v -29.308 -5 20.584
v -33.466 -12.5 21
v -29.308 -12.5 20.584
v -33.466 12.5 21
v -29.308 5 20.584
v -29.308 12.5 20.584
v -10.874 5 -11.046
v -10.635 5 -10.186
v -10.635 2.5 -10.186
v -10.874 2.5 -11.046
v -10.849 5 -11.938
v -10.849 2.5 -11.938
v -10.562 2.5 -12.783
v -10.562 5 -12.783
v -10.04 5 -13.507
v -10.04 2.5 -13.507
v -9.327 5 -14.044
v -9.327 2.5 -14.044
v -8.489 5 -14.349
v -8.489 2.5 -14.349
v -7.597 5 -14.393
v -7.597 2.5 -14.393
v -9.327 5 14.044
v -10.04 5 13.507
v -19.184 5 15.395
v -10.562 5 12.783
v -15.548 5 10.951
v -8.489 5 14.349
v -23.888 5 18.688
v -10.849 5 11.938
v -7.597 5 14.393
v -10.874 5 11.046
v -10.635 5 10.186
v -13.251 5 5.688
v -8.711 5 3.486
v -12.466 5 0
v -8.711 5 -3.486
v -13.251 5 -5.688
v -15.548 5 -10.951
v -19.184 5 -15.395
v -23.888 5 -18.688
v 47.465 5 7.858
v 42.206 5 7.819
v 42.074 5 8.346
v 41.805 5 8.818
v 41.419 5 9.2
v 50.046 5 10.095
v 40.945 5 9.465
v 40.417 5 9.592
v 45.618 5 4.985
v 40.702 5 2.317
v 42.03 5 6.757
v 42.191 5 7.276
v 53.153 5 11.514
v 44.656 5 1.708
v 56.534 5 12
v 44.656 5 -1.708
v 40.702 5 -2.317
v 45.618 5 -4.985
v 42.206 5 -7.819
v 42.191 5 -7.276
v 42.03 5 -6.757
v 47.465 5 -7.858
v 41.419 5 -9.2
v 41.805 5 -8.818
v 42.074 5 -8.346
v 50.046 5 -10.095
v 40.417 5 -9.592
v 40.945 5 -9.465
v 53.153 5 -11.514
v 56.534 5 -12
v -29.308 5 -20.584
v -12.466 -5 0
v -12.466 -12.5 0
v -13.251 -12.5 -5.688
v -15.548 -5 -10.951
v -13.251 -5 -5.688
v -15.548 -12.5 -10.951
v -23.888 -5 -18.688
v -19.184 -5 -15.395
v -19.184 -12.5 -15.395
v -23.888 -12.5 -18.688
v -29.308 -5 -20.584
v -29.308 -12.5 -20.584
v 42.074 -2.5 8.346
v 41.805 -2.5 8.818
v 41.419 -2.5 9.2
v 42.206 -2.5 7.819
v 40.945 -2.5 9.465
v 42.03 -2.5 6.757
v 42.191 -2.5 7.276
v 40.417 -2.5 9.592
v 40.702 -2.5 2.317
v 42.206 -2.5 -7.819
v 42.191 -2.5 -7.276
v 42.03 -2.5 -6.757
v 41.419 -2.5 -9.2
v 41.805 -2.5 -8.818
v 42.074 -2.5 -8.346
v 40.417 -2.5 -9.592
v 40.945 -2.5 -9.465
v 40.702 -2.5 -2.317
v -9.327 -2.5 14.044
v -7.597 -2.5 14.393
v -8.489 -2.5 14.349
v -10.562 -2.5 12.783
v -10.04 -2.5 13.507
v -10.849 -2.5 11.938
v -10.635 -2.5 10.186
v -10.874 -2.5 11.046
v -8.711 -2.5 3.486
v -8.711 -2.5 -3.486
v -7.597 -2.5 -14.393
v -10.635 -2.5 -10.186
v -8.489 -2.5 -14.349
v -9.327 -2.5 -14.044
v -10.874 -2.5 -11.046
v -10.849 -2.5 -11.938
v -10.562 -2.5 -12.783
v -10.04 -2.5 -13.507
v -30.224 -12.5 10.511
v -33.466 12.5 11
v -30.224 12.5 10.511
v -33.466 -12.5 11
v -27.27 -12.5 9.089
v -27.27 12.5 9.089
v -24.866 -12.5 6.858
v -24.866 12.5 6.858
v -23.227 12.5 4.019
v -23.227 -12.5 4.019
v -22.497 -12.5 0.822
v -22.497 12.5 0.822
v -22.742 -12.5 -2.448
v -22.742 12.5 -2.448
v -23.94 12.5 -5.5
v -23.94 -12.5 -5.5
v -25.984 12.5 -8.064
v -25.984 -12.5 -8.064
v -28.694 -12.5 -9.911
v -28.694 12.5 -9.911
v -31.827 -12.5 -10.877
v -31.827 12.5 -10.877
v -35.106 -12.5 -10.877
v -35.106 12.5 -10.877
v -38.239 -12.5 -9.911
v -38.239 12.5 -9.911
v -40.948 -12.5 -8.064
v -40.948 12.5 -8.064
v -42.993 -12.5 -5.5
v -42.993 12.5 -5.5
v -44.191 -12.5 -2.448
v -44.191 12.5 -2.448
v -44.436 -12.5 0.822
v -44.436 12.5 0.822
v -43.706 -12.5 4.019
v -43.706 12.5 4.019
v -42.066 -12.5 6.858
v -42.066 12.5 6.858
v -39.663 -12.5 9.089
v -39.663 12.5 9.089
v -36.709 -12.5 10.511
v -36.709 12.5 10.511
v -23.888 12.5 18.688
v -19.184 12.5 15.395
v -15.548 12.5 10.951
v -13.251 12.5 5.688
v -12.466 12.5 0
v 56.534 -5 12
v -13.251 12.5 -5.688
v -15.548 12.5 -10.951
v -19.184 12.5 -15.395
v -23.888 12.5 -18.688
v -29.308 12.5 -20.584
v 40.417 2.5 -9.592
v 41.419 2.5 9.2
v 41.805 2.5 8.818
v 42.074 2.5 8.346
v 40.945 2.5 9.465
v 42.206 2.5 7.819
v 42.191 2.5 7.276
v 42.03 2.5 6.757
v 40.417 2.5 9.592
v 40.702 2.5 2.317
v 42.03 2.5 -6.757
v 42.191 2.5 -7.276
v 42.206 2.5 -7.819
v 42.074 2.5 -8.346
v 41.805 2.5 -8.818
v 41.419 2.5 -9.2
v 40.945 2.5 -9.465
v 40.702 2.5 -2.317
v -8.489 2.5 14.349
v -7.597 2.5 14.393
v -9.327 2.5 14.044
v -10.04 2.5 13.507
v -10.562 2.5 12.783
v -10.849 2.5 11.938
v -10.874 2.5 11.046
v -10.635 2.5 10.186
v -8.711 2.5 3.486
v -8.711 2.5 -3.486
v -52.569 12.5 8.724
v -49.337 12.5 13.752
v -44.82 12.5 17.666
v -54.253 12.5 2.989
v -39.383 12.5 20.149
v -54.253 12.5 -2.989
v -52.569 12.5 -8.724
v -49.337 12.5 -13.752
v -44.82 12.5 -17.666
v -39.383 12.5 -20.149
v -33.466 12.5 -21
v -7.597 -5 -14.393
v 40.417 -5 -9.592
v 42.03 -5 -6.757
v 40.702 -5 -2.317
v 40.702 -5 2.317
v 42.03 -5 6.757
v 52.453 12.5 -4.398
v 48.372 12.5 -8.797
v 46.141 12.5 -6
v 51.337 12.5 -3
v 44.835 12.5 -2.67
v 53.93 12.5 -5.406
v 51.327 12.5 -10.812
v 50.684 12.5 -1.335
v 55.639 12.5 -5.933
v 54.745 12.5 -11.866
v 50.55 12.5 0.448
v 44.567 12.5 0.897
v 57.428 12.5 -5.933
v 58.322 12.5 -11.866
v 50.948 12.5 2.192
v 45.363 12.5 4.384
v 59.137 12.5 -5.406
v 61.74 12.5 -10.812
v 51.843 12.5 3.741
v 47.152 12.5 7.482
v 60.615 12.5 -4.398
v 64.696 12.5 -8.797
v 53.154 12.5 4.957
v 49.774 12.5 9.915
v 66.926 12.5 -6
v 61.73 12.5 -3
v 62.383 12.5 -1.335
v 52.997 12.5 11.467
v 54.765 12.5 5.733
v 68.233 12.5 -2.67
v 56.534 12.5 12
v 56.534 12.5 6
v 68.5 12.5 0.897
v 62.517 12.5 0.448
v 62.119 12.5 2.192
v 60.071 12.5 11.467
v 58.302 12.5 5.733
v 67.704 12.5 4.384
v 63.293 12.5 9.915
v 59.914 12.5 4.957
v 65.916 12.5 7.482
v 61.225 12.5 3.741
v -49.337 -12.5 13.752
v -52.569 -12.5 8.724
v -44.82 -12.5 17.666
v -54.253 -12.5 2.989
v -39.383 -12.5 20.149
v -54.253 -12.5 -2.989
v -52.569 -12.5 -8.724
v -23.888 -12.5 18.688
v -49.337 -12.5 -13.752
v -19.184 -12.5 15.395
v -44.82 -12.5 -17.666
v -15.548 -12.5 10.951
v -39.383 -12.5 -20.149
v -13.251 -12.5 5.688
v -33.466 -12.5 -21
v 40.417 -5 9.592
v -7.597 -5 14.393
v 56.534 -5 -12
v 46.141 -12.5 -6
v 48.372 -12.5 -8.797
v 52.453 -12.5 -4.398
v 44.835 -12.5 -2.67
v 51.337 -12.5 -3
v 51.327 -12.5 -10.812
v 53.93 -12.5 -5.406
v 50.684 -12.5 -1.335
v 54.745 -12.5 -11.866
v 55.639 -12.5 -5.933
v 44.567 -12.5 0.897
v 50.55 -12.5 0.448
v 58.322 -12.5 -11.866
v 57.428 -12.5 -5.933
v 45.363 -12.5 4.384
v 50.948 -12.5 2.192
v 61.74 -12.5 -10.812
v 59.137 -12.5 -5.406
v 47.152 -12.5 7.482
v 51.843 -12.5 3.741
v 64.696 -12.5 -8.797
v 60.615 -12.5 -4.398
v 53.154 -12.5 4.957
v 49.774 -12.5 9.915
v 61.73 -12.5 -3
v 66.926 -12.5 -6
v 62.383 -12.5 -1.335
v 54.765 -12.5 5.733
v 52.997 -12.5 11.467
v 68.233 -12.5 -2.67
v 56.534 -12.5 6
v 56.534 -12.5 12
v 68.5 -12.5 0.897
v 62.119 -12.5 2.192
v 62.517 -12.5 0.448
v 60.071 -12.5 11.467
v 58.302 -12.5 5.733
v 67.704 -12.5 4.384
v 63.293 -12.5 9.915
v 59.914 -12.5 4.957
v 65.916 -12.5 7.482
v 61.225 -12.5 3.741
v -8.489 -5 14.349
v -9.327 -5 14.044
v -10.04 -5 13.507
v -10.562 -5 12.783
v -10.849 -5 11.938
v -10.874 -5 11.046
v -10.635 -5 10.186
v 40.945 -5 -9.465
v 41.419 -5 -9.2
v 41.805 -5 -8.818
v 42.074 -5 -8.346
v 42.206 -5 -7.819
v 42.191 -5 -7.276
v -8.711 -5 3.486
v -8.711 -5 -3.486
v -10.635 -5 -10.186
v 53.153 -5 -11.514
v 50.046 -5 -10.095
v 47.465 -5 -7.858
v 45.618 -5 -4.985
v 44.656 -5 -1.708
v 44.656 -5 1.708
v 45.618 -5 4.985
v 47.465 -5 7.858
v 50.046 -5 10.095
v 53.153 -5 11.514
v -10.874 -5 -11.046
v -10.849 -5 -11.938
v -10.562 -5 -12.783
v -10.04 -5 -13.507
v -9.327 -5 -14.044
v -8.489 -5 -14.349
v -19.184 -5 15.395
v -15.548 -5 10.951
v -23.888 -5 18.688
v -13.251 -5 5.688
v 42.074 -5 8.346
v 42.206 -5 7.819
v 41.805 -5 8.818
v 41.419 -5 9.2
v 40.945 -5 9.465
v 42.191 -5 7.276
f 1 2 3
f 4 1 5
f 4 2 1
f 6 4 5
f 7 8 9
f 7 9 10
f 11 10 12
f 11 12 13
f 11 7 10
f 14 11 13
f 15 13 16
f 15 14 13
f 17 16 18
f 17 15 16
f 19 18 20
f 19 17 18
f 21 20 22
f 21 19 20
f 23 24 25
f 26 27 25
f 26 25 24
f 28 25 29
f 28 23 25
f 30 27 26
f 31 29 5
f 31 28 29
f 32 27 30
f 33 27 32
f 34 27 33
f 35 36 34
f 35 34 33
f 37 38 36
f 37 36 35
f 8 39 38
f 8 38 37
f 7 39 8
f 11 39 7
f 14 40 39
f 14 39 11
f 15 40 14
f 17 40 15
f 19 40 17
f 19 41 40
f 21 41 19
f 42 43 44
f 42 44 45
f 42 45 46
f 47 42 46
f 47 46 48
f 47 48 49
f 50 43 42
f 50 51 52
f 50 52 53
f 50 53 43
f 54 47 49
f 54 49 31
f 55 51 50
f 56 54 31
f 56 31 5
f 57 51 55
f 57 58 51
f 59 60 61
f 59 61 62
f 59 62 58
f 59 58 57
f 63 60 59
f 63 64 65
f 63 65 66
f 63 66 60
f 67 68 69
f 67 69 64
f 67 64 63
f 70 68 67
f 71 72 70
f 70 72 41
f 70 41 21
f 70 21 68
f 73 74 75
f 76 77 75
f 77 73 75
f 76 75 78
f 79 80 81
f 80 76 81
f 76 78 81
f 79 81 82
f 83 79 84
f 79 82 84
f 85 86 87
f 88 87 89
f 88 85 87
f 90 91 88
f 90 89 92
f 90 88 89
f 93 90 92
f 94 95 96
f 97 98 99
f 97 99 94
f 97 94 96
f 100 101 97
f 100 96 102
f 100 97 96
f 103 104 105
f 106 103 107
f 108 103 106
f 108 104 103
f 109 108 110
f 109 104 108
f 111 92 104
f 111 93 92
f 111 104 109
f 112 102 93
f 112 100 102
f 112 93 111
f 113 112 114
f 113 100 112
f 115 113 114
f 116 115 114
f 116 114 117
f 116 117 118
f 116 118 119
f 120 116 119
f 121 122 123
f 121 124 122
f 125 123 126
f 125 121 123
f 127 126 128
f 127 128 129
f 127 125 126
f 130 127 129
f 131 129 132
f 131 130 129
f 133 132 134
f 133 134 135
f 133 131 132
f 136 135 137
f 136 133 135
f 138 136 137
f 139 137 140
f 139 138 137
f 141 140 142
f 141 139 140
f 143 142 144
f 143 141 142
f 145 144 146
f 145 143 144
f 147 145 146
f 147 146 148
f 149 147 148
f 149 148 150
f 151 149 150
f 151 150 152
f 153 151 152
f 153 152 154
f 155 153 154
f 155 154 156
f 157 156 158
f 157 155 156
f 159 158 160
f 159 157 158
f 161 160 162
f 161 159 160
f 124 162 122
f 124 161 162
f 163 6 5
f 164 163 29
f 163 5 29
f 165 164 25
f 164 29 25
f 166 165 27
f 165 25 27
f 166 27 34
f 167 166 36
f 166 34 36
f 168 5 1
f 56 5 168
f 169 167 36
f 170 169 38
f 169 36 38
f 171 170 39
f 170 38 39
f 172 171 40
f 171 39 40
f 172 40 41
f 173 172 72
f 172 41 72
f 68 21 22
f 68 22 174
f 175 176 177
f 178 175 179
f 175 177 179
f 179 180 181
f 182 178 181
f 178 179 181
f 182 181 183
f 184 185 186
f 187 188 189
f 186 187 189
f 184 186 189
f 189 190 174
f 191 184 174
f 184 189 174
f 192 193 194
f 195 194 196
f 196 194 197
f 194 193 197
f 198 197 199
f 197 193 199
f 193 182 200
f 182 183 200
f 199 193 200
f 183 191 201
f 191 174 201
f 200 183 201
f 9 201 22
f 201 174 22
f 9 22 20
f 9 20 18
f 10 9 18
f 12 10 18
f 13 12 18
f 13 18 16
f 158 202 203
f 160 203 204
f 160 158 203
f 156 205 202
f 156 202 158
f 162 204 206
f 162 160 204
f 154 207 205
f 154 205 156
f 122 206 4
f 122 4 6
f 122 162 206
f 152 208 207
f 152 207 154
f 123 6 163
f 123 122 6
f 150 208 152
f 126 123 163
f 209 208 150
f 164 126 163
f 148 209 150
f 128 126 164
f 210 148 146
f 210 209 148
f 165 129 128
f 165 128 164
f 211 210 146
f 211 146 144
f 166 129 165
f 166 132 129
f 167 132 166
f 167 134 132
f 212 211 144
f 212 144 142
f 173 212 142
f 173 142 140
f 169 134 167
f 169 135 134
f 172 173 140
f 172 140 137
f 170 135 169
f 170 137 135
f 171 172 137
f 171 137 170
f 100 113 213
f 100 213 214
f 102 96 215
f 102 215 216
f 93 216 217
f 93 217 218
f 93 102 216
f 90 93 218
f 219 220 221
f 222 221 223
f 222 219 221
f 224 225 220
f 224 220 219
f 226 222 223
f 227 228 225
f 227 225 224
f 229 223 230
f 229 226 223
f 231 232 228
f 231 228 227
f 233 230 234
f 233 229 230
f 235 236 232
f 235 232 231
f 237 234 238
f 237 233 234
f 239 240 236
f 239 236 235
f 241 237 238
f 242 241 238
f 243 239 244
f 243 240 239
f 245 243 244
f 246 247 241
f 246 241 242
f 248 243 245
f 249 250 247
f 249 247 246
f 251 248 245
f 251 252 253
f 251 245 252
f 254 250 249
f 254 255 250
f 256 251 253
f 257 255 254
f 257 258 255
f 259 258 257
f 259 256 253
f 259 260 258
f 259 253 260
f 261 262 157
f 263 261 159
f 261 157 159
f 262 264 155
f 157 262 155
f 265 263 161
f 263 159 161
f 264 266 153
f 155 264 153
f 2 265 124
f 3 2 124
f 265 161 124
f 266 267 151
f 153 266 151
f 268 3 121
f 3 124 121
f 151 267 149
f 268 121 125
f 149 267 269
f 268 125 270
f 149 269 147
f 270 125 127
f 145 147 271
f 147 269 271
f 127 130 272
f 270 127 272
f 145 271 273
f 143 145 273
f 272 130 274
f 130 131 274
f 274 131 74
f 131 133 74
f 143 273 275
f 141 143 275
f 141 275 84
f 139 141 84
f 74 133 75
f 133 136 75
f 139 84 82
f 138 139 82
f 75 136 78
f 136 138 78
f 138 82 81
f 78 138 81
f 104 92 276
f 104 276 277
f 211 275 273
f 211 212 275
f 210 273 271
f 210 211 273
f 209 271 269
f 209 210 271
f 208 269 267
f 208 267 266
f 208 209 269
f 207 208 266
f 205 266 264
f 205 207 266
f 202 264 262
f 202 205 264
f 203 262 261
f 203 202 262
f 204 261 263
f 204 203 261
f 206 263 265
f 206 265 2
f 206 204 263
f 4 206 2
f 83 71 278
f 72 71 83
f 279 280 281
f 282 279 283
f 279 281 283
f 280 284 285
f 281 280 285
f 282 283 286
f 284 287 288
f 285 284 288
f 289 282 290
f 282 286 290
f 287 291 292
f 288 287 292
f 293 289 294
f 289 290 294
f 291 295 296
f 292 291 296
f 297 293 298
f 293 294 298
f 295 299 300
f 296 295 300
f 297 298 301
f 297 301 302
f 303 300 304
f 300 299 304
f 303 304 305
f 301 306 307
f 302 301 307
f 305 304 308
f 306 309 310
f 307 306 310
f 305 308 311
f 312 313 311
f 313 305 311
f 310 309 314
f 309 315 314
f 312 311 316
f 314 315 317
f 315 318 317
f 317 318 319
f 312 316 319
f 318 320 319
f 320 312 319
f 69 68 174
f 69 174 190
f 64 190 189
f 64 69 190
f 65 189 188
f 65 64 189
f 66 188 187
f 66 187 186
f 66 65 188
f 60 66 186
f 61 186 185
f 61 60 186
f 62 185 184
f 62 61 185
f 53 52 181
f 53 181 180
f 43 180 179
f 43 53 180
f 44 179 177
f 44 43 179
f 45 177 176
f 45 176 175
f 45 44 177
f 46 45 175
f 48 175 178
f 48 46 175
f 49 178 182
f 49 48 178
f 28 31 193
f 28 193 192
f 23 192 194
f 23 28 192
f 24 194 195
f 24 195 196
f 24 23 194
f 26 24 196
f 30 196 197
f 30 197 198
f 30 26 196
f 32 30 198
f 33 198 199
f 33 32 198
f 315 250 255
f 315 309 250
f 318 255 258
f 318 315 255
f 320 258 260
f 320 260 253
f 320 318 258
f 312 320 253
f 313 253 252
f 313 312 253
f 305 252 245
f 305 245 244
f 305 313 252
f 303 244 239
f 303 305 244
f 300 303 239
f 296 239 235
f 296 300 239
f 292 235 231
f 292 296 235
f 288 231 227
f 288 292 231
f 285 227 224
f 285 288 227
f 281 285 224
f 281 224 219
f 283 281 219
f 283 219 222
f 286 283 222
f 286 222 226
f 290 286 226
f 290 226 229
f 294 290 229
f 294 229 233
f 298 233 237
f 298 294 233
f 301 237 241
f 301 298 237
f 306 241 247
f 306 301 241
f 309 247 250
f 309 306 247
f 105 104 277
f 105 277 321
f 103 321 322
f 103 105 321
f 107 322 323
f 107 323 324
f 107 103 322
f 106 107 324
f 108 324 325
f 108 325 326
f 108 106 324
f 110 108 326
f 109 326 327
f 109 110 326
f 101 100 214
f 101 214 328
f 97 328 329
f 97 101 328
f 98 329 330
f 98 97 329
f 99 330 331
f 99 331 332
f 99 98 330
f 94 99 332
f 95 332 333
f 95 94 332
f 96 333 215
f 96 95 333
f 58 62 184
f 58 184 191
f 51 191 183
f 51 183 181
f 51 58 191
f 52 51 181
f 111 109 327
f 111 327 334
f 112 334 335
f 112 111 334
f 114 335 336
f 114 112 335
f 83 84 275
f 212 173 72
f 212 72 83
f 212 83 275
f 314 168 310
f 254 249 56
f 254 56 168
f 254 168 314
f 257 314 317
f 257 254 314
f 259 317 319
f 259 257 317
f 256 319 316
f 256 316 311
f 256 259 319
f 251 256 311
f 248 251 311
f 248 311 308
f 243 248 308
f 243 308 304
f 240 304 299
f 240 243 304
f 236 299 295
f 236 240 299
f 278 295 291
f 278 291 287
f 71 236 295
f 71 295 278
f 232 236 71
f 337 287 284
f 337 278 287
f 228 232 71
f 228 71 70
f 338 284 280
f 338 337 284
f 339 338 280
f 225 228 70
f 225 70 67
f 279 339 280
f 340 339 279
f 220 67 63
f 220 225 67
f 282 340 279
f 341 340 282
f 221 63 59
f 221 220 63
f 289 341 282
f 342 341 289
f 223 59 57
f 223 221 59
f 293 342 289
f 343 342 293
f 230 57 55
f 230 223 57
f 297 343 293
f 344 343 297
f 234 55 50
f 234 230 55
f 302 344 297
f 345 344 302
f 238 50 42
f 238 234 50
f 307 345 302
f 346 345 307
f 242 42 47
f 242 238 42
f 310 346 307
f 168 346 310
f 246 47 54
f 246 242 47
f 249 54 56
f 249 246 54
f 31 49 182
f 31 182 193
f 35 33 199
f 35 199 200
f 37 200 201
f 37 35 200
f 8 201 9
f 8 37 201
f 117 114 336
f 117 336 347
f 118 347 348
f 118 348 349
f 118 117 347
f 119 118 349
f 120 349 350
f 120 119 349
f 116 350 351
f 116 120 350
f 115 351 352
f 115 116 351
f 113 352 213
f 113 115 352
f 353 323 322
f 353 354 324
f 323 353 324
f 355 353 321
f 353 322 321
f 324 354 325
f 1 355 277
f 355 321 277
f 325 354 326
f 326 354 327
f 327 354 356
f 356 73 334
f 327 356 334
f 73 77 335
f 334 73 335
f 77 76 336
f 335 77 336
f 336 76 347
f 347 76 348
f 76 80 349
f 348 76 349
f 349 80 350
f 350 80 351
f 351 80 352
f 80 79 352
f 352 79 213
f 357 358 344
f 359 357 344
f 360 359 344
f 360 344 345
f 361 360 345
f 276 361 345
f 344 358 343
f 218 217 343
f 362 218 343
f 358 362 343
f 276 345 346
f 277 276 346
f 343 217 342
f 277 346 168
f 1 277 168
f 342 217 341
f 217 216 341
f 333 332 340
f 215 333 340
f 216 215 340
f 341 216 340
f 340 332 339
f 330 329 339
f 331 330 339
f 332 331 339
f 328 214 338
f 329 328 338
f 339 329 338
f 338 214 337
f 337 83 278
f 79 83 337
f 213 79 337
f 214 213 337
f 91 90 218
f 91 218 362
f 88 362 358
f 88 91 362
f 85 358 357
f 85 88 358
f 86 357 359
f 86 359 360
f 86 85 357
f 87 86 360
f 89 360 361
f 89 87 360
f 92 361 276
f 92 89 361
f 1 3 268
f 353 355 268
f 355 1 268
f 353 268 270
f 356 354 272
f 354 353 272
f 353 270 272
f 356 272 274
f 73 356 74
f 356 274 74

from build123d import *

# Parameters (mm, degrees)
SKETCH2_R             = 11
BOSS_EXTRUDE1_DEPTH   = 12.5
SKETCH2_R_2           = 12
SKETCH2_R_3           = 6
BOSS_EXTRUDE1_2_DEPTH = 12.5
BOSS_EXTRUDE2_DEPTH   = 5
BOSS_EXTRUDE3_DEPTH   = 2.5


with BuildPart() as part:
    # Sketch2 → Boss-Extrude1 (new, symmetric)
    with BuildSketch(Plane(origin=(0, 0, 0), x_dir=(1, 0, 0), z_dir=(0, 1, 0))):
        with BuildLine():
            ThreePointArc((-33.466351399, 21), (-54.466351399, 0), (-33.466351399, -21))
            Line((-33.466351399, -21), (-29.307935557, -20.584158416))
            ThreePointArc((-29.307935557, -20.584158416), (-12.466351399, 0), (-29.307935557, 20.584158416))
            Line((-29.307935557, 20.584158416), (-33.466351399, 21))
        make_face()
        with Locations((-33.466351399, 0)):
            Circle(SKETCH2_R, mode=Mode.SUBTRACT)
    extrude(amount=BOSS_EXTRUDE1_DEPTH, both=True)



with BuildPart() as body_2:
    # Sketch2 → Boss-Extrude1 2 (new, symmetric)
    with BuildSketch(Plane(origin=(0, 0, 0), x_dir=(1, 0, 0), z_dir=(0, 1, 0))):
        with Locations((56.533648601, 0)):
            Circle(SKETCH2_R_2)
        with Locations((56.533648601, 0)):
            Circle(SKETCH2_R_3, mode=Mode.SUBTRACT)
    extrude(amount=BOSS_EXTRUDE1_2_DEPTH, both=True)


with BuildPart() as part_1:
    add(part.part)

    add(body_2.part)  # Boss-Extrude2 merges body 2
    # Sketch2<3> → Boss-Extrude2 (add, symmetric)
    with BuildSketch(Plane(origin=(0, 0, 0), x_dir=(1, 0, 0), z_dir=(0, 1, 0))):
        with BuildLine():
            ThreePointArc((-12.466351399, 0), (-17.213248116, -13.297993595), (-29.307935557, -20.584158416))
            Line((-29.307935557, -20.584158416), (56.533648601, -12))
            ThreePointArc((56.533648601, -12), (44.533648601, 0), (56.533648601, 12))
            Line((56.533648601, 12), (-29.307935557, 20.584158416))
            ThreePointArc((-29.307935557, 20.584158416), (-17.213248116, 13.297993595), (-12.466351399, 0))
        make_face()
        with BuildLine():
            ThreePointArc((-10.635434162, 10.185736013), (-10.327887019, 13.164322574), (-7.597212937, 14.393135905))
            Line((-7.597212937, 14.393135905), (40.416577367, 9.591756875))
            ThreePointArc((40.416577367, 9.591756875), (41.955623351, 8.591212838), (42.030467559, 6.757051106))
            ThreePointArc((42.030467559, 6.757051106), (40.533648601, 0), (42.030467559, -6.757051106))
            ThreePointArc((42.030467559, -6.757051106), (41.955623351, -8.591212838), (40.416577367, -9.591756875))
            Line((40.416577367, -9.591756875), (-7.597212937, -14.393135905))
            ThreePointArc((-7.597212937, -14.393135905), (-10.327887019, -13.164322574), (-10.635434162, -10.185736013))
            ThreePointArc((-10.635434162, -10.185736013), (-8.466351399, 0), (-10.635434162, 10.185736013))
        make_face(mode=Mode.SUBTRACT)
    extrude(amount=BOSS_EXTRUDE2_DEPTH, both=True)

    # Sketch2<4> → Boss-Extrude3 (add, symmetric)
    with BuildSketch(Plane(origin=(0, 0, 0), x_dir=(1, 0, 0), z_dir=(0, 1, 0))):
        with BuildLine():
            Line((-7.597212937, 14.393135905), (40.416577367, 9.591756875))
            ThreePointArc((40.416577367, 9.591756875), (41.955623351, 8.591212838), (42.030467559, 6.757051106))
            ThreePointArc((42.030467559, 6.757051106), (40.533648601, 0), (42.030467559, -6.757051106))
            ThreePointArc((42.030467559, -6.757051106), (41.955623351, -8.591212838), (40.416577367, -9.591756875))
            Line((40.416577367, -9.591756875), (-7.597212937, -14.393135905))
            ThreePointArc((-7.597212937, -14.393135905), (-10.327887019, -13.164322574), (-10.635434162, -10.185736013))
            ThreePointArc((-10.635434162, -10.185736013), (-8.466351399, 0), (-10.635434162, 10.185736013))
            ThreePointArc((-10.635434162, 10.185736013), (-10.327887019, 13.164322574), (-7.597212937, 14.393135905))
        make_face()
    extrude(amount=BOSS_EXTRUDE3_DEPTH, both=True)


solid = part_1.part
